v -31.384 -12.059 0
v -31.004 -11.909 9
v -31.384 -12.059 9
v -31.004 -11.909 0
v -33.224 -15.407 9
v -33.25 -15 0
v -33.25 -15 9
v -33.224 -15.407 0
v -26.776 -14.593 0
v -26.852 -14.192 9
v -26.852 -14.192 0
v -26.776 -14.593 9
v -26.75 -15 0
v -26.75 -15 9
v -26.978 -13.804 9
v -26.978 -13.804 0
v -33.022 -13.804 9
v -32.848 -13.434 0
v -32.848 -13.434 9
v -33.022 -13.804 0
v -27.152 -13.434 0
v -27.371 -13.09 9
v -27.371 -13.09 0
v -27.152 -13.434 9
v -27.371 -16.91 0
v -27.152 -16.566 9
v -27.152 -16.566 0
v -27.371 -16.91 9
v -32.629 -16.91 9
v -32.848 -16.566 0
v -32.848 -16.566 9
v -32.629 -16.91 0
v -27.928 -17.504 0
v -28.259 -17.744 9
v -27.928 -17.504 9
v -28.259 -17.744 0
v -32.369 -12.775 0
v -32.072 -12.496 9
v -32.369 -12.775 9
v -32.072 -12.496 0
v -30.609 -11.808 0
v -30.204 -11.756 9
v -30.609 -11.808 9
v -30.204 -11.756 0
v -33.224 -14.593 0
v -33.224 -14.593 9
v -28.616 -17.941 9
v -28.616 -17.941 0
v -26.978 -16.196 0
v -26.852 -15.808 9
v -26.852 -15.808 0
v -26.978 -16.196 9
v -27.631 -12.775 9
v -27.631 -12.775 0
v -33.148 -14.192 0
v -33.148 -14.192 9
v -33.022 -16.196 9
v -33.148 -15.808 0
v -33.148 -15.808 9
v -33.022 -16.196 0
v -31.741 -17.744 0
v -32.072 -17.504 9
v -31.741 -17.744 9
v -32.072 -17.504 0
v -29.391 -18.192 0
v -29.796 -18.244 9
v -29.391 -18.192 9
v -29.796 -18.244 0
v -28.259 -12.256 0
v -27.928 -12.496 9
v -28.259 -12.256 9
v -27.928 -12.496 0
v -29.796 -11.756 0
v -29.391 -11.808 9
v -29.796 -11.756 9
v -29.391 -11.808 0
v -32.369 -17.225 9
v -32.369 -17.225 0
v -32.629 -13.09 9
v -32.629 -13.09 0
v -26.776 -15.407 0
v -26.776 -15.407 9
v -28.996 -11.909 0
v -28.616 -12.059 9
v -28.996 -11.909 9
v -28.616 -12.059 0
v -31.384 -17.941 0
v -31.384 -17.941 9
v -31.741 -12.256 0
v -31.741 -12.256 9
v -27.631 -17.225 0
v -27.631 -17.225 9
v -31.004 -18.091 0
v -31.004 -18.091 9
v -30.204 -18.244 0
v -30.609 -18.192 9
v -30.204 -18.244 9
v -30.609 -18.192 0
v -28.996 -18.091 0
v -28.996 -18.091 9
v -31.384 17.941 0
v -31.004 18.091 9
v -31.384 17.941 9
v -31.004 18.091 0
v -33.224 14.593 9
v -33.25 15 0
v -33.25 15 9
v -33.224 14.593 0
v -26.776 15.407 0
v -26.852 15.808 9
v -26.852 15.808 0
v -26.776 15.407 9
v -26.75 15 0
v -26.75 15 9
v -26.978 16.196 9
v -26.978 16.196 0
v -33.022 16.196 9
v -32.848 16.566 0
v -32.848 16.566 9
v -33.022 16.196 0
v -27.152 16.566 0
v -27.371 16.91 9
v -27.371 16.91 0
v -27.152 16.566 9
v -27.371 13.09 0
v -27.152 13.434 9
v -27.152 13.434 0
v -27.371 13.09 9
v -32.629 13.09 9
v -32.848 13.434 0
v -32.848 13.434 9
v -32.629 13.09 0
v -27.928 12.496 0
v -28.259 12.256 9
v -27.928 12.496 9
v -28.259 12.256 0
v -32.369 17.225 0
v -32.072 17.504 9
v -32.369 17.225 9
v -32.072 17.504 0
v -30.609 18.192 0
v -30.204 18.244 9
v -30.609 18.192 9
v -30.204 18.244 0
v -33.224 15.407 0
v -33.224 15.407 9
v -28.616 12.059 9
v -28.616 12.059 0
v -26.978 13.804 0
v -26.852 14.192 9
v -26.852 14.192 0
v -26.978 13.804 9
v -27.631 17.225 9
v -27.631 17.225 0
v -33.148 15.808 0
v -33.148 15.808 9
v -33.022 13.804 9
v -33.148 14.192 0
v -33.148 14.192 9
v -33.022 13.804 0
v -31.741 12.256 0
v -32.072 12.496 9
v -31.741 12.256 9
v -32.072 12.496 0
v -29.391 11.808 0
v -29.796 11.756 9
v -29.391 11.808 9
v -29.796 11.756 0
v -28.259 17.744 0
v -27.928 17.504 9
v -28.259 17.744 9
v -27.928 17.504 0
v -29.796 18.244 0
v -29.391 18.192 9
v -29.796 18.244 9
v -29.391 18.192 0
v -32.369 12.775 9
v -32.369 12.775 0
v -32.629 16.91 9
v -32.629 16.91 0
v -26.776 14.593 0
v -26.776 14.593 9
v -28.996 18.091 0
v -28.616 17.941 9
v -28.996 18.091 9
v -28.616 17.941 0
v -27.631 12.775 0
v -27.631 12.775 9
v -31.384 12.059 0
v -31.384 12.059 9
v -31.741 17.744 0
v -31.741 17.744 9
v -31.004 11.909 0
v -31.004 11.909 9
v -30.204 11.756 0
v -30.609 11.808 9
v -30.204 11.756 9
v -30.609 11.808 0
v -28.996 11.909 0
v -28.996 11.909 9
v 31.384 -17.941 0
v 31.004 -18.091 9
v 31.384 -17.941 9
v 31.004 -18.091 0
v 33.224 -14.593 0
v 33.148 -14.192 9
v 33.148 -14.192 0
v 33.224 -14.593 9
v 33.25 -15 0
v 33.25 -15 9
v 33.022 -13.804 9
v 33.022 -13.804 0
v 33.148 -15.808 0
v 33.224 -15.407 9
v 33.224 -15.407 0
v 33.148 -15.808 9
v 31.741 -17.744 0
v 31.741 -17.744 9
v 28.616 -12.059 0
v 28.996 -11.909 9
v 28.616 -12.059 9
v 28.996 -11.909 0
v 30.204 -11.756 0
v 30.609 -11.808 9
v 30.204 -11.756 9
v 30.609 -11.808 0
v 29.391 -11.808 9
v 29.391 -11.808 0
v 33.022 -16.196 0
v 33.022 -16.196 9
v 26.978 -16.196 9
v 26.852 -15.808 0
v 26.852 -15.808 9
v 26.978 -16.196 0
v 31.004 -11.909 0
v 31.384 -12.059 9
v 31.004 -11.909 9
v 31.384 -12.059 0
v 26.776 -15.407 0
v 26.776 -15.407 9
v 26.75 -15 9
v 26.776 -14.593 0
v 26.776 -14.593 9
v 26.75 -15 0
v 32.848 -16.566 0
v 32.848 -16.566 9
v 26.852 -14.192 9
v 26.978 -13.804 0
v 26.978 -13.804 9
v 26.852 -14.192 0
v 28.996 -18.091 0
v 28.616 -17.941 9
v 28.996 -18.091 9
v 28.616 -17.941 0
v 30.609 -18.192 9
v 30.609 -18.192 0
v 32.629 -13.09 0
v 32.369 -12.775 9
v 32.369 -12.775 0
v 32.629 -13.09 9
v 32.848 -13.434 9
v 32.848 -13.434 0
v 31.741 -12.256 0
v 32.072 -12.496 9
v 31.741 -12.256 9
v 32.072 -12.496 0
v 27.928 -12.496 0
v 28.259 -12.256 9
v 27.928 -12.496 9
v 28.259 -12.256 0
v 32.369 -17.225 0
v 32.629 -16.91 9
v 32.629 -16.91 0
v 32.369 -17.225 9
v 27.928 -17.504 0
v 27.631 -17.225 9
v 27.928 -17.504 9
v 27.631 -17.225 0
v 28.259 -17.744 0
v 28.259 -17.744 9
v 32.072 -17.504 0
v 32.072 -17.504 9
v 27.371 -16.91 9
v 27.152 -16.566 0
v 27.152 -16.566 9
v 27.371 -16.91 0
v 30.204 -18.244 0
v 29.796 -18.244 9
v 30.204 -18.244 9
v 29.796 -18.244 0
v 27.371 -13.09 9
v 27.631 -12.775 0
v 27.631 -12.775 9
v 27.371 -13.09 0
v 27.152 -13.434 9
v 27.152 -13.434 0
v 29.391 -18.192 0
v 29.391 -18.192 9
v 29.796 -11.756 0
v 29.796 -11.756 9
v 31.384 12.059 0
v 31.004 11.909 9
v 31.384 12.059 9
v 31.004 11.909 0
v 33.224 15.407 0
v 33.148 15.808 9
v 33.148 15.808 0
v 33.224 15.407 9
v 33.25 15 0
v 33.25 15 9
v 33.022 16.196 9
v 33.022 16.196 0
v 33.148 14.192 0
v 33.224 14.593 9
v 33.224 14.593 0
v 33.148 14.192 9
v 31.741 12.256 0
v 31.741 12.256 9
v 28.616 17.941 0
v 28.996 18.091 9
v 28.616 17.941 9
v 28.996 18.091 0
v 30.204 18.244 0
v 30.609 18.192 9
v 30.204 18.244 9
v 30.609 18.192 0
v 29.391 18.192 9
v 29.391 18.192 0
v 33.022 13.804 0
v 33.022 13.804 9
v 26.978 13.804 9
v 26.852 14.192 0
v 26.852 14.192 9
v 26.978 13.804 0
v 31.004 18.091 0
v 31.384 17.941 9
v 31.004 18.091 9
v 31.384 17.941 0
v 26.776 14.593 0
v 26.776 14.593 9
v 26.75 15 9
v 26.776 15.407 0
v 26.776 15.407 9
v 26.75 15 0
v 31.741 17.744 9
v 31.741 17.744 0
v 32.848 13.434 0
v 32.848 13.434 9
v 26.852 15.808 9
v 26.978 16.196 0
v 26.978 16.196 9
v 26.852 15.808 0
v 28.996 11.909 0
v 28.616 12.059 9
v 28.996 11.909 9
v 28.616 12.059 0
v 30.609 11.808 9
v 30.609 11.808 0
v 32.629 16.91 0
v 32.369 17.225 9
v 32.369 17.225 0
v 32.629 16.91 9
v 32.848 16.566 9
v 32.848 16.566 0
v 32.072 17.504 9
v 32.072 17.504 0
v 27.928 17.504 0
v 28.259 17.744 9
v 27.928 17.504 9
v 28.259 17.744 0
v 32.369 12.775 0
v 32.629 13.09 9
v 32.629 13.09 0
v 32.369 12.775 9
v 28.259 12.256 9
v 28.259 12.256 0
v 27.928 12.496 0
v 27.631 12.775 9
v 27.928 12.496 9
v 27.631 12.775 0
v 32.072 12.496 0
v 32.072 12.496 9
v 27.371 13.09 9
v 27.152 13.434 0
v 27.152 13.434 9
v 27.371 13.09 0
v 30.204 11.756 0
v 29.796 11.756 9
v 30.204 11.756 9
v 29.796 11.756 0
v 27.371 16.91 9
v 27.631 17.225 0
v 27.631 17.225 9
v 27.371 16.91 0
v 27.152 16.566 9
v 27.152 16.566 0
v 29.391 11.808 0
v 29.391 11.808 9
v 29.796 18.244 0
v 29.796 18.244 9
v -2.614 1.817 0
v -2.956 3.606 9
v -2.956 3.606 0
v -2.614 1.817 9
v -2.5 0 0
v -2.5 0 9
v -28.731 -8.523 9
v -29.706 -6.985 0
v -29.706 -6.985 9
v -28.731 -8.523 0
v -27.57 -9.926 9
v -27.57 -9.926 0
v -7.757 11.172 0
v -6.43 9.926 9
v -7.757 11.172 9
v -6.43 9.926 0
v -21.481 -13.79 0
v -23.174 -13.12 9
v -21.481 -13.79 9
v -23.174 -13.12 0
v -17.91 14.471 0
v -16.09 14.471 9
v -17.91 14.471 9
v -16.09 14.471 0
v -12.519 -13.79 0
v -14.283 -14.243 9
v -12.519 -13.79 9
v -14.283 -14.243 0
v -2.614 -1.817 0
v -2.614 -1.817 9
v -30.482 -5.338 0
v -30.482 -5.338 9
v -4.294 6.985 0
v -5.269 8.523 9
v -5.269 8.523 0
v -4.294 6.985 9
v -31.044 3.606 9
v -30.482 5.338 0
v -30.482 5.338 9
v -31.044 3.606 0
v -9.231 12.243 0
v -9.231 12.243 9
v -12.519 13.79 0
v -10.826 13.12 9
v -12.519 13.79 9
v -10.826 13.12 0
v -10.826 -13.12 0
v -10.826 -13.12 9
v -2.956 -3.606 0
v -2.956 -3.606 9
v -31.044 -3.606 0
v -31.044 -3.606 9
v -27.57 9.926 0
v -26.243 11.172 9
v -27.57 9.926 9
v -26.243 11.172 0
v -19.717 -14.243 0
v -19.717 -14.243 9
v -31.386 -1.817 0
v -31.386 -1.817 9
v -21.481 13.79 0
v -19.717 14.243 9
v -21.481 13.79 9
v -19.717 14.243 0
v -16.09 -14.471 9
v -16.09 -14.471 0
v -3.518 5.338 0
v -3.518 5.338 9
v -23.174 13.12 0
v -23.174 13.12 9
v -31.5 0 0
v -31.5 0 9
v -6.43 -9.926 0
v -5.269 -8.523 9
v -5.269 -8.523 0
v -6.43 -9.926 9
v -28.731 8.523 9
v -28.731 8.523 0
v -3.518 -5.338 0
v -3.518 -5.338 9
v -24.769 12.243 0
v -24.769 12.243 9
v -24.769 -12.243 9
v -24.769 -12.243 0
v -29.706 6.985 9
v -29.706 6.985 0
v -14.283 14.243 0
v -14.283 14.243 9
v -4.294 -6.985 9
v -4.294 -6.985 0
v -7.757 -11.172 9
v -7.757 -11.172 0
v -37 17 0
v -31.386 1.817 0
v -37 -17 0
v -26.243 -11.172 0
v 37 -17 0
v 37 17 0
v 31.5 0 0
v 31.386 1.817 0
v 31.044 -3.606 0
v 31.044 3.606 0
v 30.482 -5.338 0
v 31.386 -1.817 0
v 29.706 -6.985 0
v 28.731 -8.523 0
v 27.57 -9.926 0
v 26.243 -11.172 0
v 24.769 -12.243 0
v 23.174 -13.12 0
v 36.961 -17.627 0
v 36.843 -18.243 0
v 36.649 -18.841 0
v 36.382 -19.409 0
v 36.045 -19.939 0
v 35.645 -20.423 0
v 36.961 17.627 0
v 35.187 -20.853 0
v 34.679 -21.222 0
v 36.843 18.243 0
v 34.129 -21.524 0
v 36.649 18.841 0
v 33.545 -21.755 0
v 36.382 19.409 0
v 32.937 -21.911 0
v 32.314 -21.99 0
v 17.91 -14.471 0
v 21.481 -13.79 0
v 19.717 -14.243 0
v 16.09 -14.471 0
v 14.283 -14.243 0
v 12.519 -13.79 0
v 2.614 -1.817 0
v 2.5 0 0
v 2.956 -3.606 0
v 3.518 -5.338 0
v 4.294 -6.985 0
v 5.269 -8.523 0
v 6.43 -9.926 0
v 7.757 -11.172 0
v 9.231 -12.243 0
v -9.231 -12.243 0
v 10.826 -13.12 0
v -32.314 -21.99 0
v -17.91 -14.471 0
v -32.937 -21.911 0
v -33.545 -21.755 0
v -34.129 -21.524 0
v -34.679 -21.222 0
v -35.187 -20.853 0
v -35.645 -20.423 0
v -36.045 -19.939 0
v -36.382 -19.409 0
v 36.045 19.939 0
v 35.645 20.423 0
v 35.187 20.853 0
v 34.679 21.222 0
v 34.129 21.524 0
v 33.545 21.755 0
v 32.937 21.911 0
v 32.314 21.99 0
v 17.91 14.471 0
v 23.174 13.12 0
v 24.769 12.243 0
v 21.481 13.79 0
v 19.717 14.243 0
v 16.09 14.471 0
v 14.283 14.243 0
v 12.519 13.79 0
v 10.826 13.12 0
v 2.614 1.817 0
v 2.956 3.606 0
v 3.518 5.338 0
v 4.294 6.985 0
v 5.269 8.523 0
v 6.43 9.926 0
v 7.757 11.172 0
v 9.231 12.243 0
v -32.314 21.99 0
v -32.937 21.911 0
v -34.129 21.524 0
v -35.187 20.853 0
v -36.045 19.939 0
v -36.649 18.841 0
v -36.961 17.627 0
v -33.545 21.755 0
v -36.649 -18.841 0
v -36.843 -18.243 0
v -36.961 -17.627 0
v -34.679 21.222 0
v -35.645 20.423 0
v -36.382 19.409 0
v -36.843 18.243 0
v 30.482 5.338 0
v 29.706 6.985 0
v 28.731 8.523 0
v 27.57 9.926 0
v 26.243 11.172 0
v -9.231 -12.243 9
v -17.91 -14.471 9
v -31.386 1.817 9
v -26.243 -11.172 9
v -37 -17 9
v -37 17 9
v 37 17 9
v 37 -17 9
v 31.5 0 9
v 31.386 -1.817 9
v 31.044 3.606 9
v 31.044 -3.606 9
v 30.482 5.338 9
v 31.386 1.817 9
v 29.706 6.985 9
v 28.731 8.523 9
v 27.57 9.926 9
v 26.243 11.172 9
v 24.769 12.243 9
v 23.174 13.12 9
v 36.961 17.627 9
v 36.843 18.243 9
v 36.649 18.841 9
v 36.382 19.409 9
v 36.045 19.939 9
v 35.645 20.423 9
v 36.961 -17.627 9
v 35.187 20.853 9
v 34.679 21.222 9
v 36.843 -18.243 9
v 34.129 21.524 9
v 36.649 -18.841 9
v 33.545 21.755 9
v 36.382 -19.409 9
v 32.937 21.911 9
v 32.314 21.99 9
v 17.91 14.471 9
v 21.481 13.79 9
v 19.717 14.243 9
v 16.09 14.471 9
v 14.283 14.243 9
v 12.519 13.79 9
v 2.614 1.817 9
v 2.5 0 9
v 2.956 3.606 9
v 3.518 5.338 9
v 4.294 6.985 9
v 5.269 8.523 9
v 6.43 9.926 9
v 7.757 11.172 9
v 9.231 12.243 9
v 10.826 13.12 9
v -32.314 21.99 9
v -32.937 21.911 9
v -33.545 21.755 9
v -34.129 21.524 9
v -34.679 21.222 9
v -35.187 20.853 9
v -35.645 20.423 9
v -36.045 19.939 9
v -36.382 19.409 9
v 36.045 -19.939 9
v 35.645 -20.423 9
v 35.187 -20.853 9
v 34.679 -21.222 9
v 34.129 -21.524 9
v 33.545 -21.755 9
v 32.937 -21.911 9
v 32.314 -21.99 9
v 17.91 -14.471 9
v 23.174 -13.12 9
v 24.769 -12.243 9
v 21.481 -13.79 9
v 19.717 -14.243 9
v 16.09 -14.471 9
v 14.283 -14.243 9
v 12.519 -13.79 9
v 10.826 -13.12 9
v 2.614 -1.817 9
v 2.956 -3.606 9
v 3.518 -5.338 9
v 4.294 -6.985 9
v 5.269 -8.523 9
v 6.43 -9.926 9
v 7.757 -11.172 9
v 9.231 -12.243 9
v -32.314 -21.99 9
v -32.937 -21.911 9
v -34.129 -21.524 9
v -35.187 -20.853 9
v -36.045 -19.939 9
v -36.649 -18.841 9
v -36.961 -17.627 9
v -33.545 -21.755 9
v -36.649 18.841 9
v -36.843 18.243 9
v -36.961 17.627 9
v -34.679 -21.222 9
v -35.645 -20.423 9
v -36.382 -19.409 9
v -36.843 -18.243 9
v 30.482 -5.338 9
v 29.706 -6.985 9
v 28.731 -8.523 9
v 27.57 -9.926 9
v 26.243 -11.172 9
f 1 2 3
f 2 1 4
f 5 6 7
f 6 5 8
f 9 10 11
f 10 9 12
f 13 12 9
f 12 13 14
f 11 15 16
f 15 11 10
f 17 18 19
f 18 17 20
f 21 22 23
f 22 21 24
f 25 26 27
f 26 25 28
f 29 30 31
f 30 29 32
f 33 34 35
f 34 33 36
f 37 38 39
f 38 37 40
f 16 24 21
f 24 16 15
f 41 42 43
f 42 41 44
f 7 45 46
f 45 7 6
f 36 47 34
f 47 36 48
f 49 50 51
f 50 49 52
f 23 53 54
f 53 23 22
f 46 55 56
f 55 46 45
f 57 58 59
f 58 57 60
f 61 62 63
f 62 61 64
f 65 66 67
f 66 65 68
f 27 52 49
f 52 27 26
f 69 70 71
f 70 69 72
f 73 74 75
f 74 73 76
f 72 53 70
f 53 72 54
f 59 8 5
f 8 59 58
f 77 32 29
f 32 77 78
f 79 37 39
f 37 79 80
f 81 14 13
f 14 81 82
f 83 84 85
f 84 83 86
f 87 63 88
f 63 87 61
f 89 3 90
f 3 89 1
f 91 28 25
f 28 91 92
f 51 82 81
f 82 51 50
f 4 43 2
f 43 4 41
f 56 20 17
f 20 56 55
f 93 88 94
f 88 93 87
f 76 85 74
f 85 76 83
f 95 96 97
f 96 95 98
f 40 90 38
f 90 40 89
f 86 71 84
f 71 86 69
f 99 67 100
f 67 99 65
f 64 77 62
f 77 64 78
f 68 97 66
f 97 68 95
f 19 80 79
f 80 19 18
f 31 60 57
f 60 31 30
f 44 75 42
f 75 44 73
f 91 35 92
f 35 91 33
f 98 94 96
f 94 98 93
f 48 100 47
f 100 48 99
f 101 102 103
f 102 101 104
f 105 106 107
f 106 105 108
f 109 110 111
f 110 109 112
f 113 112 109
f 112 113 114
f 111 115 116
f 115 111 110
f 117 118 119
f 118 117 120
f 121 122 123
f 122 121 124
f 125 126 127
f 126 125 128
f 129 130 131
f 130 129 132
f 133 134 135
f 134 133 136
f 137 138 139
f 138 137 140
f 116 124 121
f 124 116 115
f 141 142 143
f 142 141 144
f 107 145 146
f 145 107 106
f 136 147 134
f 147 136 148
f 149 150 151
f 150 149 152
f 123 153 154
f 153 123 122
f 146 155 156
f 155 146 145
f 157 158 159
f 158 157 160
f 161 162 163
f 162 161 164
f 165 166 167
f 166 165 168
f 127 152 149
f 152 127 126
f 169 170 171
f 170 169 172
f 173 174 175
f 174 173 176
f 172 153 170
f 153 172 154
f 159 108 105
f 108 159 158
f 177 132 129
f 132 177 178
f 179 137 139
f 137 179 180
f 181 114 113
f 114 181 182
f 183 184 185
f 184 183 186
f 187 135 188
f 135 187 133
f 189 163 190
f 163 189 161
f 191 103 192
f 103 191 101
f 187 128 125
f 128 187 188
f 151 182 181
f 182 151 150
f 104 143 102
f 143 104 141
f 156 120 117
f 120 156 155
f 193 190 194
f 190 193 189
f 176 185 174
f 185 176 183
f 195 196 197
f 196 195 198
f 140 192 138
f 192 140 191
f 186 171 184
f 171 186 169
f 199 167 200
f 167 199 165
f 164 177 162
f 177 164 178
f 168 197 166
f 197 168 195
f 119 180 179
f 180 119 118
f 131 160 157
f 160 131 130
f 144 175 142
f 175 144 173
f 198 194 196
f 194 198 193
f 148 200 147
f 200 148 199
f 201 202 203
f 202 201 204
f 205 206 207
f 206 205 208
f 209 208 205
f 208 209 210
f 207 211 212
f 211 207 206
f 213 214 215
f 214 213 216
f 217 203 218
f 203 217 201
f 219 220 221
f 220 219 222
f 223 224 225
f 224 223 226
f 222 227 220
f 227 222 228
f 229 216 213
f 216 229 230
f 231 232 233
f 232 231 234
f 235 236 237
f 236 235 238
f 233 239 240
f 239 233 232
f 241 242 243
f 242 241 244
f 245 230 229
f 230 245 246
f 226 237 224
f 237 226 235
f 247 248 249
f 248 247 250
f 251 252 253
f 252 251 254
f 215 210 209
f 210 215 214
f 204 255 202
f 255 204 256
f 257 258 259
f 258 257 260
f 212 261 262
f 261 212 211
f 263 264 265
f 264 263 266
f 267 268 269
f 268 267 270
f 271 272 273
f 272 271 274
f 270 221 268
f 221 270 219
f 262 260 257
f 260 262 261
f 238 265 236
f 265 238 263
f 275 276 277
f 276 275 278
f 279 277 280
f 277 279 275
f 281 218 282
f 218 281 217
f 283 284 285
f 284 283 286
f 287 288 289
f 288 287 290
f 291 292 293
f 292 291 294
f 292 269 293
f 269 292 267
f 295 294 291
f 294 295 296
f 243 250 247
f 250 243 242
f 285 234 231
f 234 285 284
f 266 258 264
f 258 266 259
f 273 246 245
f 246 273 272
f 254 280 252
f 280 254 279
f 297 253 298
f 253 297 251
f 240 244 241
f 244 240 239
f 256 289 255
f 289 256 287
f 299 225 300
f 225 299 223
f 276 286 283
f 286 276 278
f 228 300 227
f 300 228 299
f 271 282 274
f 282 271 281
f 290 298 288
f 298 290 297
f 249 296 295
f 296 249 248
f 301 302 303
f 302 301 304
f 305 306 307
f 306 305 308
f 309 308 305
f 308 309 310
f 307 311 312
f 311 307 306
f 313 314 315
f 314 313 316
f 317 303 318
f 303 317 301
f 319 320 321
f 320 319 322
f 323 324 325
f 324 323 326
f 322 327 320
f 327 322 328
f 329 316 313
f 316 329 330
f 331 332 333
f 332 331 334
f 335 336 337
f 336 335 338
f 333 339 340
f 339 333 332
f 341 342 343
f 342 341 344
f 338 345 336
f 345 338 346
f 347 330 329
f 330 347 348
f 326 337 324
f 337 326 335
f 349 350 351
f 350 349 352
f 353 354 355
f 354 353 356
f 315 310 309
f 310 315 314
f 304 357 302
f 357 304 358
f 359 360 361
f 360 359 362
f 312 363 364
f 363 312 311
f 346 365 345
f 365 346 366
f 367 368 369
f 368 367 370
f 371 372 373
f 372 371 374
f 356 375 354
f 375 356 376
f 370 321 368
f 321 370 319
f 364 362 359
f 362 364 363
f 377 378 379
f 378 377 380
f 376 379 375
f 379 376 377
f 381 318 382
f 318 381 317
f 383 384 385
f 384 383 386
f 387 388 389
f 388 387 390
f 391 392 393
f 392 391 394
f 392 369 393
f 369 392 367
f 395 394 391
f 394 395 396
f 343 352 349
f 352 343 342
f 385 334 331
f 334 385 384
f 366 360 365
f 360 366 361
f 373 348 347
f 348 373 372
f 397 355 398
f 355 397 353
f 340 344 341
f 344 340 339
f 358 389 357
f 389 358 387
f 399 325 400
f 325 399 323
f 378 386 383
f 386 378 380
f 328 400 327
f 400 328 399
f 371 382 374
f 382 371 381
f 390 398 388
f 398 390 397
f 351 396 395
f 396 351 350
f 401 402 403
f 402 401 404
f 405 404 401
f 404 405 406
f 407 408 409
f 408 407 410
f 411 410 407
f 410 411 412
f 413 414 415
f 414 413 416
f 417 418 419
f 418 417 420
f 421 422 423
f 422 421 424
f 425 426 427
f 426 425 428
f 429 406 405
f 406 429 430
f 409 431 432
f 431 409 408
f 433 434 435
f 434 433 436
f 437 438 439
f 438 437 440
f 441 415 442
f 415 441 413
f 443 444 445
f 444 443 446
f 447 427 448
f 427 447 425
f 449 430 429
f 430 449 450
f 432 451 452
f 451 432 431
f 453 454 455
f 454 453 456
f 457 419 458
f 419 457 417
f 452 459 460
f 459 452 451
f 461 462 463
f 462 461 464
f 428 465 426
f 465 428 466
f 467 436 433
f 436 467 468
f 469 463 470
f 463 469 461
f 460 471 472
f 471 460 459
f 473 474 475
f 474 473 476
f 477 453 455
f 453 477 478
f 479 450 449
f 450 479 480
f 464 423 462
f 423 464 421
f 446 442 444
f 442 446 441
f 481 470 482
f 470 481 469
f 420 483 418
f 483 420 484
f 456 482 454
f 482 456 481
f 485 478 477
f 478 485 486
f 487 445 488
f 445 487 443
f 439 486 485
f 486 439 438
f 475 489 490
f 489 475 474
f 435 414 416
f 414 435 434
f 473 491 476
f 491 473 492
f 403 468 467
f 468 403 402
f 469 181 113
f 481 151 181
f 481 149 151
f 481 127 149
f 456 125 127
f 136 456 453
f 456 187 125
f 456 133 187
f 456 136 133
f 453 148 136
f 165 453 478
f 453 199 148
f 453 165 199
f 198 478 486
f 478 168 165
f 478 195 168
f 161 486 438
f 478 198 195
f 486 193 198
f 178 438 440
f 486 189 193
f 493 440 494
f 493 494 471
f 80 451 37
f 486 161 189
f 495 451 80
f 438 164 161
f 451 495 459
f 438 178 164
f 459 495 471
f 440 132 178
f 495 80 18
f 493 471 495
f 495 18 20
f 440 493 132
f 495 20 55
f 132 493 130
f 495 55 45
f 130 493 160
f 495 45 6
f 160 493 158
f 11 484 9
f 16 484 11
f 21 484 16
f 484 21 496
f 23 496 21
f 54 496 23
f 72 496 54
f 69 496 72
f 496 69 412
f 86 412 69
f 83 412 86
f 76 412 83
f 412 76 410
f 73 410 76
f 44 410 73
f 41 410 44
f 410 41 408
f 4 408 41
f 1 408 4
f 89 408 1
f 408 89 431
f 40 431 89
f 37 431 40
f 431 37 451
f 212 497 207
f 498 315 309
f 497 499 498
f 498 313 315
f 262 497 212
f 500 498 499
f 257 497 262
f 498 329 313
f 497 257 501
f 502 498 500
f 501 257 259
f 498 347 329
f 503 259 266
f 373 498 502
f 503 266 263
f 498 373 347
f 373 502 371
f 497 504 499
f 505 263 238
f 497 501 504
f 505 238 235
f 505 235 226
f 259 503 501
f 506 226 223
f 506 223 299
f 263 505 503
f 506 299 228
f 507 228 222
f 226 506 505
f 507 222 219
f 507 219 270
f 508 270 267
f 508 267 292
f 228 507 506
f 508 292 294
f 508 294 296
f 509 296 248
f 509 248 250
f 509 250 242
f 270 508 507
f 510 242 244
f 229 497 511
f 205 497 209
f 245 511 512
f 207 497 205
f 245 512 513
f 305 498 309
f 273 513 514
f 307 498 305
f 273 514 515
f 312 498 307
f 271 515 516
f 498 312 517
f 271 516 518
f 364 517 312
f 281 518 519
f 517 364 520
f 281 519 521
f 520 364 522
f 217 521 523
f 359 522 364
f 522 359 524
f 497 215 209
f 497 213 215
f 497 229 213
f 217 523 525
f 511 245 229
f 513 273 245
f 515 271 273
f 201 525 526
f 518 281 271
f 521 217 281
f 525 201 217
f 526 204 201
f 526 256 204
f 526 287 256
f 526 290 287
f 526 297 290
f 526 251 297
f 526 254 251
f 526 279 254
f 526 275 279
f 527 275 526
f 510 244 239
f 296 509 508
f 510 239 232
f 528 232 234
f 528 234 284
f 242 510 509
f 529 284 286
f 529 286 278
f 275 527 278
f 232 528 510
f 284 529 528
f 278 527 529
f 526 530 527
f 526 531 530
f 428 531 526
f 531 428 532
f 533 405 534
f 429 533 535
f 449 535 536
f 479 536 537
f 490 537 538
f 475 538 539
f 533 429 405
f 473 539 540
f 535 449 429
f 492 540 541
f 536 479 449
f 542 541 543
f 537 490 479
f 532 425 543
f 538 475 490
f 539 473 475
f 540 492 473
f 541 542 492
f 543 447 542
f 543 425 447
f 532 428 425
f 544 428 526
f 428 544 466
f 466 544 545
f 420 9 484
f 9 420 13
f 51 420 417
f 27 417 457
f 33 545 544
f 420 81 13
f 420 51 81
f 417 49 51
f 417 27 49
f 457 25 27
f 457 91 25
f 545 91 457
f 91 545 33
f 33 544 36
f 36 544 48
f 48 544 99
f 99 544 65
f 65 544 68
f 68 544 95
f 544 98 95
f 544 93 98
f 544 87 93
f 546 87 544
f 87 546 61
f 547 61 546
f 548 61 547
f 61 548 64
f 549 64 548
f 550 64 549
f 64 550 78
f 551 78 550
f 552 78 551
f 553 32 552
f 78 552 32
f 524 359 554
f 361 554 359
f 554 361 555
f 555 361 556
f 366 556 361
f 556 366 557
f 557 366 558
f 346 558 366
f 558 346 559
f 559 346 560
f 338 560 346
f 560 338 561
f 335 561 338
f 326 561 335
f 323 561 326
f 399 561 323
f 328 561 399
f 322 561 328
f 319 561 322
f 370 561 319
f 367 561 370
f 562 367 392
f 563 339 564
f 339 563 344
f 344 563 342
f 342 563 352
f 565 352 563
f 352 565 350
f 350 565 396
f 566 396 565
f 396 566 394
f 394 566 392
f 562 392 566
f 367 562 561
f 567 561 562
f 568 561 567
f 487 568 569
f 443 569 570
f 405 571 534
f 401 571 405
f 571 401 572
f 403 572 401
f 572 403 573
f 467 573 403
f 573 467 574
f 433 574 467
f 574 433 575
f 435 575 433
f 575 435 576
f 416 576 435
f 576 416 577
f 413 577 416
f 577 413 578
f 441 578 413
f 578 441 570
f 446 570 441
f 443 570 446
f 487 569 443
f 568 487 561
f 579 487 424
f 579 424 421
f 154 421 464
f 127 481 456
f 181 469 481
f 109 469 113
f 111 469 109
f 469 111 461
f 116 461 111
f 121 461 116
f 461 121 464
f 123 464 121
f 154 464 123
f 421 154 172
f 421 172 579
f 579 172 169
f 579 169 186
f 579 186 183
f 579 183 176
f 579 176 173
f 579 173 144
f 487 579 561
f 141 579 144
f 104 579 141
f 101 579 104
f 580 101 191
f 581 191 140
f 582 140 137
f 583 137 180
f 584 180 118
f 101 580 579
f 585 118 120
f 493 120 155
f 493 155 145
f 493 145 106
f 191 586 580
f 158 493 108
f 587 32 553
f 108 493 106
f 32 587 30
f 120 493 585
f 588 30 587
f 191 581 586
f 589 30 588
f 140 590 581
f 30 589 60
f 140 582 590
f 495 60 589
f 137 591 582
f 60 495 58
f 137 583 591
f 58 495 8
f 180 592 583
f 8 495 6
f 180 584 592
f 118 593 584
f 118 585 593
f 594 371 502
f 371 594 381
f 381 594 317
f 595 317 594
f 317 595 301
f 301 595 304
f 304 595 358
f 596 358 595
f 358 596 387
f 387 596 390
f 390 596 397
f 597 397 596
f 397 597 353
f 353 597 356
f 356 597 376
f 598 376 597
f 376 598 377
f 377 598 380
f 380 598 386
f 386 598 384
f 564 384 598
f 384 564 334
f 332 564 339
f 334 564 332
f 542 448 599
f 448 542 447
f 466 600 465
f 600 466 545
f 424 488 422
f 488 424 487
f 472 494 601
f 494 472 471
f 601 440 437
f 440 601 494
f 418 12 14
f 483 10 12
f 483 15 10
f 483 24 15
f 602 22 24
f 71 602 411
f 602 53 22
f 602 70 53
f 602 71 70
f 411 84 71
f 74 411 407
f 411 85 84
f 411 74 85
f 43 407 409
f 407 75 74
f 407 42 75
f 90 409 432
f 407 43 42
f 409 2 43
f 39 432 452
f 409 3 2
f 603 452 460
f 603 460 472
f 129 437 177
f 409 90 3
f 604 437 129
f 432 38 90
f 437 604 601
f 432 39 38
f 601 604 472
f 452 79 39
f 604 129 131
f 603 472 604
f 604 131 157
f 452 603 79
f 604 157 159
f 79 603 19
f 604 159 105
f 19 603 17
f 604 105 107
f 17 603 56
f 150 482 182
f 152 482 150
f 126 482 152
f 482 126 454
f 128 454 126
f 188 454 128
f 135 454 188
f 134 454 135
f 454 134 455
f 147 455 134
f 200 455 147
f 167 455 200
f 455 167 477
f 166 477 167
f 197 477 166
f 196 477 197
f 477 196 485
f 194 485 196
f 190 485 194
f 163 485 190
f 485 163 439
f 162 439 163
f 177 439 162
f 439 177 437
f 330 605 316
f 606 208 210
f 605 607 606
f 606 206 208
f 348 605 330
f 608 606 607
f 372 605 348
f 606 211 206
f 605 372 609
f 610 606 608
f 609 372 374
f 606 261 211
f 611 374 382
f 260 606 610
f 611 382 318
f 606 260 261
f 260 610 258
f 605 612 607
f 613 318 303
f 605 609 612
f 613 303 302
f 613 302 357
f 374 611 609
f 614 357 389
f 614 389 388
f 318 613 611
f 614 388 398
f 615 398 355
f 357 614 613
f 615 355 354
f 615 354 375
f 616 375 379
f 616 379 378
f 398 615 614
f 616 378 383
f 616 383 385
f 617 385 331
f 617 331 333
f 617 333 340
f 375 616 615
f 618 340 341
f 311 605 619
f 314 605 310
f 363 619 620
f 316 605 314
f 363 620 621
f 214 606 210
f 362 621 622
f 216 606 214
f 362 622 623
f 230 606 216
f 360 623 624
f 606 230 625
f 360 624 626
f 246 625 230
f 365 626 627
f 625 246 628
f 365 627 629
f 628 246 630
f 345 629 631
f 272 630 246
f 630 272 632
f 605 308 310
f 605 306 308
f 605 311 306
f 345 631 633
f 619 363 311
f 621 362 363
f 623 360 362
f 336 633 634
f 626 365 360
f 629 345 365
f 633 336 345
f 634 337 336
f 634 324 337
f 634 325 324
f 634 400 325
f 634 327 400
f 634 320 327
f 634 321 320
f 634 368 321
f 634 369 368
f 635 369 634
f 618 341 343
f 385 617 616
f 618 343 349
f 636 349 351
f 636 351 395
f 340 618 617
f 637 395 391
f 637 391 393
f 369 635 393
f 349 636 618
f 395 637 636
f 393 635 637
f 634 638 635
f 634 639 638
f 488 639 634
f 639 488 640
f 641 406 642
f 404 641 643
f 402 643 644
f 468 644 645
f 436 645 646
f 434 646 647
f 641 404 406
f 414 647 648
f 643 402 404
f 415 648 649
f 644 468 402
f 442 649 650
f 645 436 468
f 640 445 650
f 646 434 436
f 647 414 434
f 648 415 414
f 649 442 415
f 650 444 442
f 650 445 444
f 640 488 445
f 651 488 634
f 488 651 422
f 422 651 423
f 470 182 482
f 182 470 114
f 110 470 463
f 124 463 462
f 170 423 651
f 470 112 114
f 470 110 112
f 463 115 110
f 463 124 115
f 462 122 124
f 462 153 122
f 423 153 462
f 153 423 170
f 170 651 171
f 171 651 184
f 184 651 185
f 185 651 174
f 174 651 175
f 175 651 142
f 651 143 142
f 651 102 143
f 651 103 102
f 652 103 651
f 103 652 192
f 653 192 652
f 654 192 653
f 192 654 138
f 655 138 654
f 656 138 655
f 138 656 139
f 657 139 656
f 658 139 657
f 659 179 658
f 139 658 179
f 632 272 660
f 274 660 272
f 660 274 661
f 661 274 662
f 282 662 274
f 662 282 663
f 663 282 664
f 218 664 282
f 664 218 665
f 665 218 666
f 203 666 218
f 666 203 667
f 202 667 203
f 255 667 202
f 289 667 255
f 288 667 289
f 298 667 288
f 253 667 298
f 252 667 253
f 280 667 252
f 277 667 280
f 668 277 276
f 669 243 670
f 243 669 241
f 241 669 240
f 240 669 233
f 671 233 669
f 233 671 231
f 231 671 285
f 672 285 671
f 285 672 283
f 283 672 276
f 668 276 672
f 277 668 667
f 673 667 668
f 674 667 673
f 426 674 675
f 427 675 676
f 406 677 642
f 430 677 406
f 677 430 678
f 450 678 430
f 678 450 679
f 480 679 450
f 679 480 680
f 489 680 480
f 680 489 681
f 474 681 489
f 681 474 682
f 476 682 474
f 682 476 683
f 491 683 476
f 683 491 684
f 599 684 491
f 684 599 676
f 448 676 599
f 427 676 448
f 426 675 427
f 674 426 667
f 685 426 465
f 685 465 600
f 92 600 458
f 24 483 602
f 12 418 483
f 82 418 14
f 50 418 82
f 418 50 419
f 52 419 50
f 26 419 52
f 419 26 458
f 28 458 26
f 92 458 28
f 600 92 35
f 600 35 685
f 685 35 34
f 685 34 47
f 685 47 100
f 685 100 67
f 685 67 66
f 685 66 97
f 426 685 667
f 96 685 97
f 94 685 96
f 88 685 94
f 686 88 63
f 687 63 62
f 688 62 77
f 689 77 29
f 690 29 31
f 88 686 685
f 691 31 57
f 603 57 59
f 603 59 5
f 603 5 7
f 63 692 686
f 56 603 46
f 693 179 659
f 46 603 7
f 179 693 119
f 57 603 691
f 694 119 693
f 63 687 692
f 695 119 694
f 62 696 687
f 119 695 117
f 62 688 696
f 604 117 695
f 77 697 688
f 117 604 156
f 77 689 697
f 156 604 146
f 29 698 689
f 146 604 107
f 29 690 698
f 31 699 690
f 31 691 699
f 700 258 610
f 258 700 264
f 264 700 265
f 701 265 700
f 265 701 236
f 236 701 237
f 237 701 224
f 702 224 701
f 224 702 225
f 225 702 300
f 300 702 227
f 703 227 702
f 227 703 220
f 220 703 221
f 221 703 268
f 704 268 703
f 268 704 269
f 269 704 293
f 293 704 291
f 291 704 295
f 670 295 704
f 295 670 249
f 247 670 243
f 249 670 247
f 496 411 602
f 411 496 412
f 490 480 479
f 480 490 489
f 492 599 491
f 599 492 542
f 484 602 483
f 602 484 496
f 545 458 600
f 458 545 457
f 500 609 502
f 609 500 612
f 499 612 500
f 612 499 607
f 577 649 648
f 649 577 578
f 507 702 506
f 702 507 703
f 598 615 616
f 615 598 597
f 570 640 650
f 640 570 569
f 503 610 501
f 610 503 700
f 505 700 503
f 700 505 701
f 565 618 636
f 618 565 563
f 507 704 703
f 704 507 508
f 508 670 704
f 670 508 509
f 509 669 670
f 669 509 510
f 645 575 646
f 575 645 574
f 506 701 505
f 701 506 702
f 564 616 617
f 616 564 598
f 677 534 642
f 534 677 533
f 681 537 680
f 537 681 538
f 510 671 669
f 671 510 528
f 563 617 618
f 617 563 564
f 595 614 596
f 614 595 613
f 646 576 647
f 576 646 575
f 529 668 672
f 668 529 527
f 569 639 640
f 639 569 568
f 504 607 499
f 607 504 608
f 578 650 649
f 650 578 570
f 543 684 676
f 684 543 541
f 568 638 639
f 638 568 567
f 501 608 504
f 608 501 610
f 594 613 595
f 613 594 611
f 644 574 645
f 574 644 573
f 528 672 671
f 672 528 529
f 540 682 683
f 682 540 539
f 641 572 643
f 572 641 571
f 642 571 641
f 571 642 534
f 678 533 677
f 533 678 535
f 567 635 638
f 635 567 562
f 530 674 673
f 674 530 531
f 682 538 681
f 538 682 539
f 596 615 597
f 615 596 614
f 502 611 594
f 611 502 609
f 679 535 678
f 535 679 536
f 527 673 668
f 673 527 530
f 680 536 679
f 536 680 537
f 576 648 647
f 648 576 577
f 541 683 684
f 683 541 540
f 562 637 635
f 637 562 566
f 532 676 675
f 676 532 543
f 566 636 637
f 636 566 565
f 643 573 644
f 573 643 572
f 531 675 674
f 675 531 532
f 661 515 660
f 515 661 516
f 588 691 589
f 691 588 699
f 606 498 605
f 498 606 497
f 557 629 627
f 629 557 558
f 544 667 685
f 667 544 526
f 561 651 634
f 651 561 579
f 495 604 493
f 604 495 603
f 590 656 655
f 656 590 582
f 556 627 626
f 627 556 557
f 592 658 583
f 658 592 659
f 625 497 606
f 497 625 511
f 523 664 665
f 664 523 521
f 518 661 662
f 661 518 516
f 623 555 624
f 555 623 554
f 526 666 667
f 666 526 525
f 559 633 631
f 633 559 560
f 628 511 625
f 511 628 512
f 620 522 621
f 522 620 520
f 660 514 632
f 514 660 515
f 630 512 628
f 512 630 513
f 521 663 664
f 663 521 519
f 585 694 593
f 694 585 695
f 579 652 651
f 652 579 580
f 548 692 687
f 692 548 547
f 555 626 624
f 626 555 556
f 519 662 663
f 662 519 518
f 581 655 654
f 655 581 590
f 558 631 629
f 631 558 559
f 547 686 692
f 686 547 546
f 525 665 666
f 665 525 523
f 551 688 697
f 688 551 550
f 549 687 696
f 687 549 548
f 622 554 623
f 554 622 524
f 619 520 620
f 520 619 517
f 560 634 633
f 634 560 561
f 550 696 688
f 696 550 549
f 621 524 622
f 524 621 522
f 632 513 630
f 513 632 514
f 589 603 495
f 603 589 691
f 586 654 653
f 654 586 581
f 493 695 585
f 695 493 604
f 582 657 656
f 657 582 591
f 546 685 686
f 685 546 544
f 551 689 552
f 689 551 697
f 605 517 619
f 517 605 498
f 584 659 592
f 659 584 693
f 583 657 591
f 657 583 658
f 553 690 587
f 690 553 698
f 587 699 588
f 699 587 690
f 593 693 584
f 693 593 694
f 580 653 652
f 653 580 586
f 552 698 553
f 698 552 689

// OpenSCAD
$fn = 50;


difference() {
	union() {
		hull() {
			translate(v = [-32.0000000000, 17.0000000000, 0]) {
				cylinder(h = 9, r = 5);
			}
			translate(v = [32.0000000000, 17.0000000000, 0]) {
				cylinder(h = 9, r = 5);
			}
			translate(v = [-32.0000000000, -17.0000000000, 0]) {
				cylinder(h = 9, r = 5);
			}
			translate(v = [32.0000000000, -17.0000000000, 0]) {
				cylinder(h = 9, r = 5);
			}
		}
	}
	union() {
		#translate(v = [-30.0000000000, -15.0000000000, -100.0000000000]) {
			cylinder(h = 200, r = 3.2500000000);
		}
		#translate(v = [-30.0000000000, 15.0000000000, -100.0000000000]) {
			cylinder(h = 200, r = 3.2500000000);
		}
		#translate(v = [30.0000000000, -15.0000000000, -100.0000000000]) {
			cylinder(h = 200, r = 3.2500000000);
		}
		#translate(v = [30.0000000000, 15.0000000000, -100.0000000000]) {
			cylinder(h = 200, r = 3.2500000000);
		}
		#translate(v = [-17.0000000000, 0, 0]) {
			cylinder(h = 9, r = 14.5000000000);
		}
		#translate(v = [17.0000000000, 0, 0]) {
			cylinder(h = 9, r = 14.5000000000);
		}
	}
}
